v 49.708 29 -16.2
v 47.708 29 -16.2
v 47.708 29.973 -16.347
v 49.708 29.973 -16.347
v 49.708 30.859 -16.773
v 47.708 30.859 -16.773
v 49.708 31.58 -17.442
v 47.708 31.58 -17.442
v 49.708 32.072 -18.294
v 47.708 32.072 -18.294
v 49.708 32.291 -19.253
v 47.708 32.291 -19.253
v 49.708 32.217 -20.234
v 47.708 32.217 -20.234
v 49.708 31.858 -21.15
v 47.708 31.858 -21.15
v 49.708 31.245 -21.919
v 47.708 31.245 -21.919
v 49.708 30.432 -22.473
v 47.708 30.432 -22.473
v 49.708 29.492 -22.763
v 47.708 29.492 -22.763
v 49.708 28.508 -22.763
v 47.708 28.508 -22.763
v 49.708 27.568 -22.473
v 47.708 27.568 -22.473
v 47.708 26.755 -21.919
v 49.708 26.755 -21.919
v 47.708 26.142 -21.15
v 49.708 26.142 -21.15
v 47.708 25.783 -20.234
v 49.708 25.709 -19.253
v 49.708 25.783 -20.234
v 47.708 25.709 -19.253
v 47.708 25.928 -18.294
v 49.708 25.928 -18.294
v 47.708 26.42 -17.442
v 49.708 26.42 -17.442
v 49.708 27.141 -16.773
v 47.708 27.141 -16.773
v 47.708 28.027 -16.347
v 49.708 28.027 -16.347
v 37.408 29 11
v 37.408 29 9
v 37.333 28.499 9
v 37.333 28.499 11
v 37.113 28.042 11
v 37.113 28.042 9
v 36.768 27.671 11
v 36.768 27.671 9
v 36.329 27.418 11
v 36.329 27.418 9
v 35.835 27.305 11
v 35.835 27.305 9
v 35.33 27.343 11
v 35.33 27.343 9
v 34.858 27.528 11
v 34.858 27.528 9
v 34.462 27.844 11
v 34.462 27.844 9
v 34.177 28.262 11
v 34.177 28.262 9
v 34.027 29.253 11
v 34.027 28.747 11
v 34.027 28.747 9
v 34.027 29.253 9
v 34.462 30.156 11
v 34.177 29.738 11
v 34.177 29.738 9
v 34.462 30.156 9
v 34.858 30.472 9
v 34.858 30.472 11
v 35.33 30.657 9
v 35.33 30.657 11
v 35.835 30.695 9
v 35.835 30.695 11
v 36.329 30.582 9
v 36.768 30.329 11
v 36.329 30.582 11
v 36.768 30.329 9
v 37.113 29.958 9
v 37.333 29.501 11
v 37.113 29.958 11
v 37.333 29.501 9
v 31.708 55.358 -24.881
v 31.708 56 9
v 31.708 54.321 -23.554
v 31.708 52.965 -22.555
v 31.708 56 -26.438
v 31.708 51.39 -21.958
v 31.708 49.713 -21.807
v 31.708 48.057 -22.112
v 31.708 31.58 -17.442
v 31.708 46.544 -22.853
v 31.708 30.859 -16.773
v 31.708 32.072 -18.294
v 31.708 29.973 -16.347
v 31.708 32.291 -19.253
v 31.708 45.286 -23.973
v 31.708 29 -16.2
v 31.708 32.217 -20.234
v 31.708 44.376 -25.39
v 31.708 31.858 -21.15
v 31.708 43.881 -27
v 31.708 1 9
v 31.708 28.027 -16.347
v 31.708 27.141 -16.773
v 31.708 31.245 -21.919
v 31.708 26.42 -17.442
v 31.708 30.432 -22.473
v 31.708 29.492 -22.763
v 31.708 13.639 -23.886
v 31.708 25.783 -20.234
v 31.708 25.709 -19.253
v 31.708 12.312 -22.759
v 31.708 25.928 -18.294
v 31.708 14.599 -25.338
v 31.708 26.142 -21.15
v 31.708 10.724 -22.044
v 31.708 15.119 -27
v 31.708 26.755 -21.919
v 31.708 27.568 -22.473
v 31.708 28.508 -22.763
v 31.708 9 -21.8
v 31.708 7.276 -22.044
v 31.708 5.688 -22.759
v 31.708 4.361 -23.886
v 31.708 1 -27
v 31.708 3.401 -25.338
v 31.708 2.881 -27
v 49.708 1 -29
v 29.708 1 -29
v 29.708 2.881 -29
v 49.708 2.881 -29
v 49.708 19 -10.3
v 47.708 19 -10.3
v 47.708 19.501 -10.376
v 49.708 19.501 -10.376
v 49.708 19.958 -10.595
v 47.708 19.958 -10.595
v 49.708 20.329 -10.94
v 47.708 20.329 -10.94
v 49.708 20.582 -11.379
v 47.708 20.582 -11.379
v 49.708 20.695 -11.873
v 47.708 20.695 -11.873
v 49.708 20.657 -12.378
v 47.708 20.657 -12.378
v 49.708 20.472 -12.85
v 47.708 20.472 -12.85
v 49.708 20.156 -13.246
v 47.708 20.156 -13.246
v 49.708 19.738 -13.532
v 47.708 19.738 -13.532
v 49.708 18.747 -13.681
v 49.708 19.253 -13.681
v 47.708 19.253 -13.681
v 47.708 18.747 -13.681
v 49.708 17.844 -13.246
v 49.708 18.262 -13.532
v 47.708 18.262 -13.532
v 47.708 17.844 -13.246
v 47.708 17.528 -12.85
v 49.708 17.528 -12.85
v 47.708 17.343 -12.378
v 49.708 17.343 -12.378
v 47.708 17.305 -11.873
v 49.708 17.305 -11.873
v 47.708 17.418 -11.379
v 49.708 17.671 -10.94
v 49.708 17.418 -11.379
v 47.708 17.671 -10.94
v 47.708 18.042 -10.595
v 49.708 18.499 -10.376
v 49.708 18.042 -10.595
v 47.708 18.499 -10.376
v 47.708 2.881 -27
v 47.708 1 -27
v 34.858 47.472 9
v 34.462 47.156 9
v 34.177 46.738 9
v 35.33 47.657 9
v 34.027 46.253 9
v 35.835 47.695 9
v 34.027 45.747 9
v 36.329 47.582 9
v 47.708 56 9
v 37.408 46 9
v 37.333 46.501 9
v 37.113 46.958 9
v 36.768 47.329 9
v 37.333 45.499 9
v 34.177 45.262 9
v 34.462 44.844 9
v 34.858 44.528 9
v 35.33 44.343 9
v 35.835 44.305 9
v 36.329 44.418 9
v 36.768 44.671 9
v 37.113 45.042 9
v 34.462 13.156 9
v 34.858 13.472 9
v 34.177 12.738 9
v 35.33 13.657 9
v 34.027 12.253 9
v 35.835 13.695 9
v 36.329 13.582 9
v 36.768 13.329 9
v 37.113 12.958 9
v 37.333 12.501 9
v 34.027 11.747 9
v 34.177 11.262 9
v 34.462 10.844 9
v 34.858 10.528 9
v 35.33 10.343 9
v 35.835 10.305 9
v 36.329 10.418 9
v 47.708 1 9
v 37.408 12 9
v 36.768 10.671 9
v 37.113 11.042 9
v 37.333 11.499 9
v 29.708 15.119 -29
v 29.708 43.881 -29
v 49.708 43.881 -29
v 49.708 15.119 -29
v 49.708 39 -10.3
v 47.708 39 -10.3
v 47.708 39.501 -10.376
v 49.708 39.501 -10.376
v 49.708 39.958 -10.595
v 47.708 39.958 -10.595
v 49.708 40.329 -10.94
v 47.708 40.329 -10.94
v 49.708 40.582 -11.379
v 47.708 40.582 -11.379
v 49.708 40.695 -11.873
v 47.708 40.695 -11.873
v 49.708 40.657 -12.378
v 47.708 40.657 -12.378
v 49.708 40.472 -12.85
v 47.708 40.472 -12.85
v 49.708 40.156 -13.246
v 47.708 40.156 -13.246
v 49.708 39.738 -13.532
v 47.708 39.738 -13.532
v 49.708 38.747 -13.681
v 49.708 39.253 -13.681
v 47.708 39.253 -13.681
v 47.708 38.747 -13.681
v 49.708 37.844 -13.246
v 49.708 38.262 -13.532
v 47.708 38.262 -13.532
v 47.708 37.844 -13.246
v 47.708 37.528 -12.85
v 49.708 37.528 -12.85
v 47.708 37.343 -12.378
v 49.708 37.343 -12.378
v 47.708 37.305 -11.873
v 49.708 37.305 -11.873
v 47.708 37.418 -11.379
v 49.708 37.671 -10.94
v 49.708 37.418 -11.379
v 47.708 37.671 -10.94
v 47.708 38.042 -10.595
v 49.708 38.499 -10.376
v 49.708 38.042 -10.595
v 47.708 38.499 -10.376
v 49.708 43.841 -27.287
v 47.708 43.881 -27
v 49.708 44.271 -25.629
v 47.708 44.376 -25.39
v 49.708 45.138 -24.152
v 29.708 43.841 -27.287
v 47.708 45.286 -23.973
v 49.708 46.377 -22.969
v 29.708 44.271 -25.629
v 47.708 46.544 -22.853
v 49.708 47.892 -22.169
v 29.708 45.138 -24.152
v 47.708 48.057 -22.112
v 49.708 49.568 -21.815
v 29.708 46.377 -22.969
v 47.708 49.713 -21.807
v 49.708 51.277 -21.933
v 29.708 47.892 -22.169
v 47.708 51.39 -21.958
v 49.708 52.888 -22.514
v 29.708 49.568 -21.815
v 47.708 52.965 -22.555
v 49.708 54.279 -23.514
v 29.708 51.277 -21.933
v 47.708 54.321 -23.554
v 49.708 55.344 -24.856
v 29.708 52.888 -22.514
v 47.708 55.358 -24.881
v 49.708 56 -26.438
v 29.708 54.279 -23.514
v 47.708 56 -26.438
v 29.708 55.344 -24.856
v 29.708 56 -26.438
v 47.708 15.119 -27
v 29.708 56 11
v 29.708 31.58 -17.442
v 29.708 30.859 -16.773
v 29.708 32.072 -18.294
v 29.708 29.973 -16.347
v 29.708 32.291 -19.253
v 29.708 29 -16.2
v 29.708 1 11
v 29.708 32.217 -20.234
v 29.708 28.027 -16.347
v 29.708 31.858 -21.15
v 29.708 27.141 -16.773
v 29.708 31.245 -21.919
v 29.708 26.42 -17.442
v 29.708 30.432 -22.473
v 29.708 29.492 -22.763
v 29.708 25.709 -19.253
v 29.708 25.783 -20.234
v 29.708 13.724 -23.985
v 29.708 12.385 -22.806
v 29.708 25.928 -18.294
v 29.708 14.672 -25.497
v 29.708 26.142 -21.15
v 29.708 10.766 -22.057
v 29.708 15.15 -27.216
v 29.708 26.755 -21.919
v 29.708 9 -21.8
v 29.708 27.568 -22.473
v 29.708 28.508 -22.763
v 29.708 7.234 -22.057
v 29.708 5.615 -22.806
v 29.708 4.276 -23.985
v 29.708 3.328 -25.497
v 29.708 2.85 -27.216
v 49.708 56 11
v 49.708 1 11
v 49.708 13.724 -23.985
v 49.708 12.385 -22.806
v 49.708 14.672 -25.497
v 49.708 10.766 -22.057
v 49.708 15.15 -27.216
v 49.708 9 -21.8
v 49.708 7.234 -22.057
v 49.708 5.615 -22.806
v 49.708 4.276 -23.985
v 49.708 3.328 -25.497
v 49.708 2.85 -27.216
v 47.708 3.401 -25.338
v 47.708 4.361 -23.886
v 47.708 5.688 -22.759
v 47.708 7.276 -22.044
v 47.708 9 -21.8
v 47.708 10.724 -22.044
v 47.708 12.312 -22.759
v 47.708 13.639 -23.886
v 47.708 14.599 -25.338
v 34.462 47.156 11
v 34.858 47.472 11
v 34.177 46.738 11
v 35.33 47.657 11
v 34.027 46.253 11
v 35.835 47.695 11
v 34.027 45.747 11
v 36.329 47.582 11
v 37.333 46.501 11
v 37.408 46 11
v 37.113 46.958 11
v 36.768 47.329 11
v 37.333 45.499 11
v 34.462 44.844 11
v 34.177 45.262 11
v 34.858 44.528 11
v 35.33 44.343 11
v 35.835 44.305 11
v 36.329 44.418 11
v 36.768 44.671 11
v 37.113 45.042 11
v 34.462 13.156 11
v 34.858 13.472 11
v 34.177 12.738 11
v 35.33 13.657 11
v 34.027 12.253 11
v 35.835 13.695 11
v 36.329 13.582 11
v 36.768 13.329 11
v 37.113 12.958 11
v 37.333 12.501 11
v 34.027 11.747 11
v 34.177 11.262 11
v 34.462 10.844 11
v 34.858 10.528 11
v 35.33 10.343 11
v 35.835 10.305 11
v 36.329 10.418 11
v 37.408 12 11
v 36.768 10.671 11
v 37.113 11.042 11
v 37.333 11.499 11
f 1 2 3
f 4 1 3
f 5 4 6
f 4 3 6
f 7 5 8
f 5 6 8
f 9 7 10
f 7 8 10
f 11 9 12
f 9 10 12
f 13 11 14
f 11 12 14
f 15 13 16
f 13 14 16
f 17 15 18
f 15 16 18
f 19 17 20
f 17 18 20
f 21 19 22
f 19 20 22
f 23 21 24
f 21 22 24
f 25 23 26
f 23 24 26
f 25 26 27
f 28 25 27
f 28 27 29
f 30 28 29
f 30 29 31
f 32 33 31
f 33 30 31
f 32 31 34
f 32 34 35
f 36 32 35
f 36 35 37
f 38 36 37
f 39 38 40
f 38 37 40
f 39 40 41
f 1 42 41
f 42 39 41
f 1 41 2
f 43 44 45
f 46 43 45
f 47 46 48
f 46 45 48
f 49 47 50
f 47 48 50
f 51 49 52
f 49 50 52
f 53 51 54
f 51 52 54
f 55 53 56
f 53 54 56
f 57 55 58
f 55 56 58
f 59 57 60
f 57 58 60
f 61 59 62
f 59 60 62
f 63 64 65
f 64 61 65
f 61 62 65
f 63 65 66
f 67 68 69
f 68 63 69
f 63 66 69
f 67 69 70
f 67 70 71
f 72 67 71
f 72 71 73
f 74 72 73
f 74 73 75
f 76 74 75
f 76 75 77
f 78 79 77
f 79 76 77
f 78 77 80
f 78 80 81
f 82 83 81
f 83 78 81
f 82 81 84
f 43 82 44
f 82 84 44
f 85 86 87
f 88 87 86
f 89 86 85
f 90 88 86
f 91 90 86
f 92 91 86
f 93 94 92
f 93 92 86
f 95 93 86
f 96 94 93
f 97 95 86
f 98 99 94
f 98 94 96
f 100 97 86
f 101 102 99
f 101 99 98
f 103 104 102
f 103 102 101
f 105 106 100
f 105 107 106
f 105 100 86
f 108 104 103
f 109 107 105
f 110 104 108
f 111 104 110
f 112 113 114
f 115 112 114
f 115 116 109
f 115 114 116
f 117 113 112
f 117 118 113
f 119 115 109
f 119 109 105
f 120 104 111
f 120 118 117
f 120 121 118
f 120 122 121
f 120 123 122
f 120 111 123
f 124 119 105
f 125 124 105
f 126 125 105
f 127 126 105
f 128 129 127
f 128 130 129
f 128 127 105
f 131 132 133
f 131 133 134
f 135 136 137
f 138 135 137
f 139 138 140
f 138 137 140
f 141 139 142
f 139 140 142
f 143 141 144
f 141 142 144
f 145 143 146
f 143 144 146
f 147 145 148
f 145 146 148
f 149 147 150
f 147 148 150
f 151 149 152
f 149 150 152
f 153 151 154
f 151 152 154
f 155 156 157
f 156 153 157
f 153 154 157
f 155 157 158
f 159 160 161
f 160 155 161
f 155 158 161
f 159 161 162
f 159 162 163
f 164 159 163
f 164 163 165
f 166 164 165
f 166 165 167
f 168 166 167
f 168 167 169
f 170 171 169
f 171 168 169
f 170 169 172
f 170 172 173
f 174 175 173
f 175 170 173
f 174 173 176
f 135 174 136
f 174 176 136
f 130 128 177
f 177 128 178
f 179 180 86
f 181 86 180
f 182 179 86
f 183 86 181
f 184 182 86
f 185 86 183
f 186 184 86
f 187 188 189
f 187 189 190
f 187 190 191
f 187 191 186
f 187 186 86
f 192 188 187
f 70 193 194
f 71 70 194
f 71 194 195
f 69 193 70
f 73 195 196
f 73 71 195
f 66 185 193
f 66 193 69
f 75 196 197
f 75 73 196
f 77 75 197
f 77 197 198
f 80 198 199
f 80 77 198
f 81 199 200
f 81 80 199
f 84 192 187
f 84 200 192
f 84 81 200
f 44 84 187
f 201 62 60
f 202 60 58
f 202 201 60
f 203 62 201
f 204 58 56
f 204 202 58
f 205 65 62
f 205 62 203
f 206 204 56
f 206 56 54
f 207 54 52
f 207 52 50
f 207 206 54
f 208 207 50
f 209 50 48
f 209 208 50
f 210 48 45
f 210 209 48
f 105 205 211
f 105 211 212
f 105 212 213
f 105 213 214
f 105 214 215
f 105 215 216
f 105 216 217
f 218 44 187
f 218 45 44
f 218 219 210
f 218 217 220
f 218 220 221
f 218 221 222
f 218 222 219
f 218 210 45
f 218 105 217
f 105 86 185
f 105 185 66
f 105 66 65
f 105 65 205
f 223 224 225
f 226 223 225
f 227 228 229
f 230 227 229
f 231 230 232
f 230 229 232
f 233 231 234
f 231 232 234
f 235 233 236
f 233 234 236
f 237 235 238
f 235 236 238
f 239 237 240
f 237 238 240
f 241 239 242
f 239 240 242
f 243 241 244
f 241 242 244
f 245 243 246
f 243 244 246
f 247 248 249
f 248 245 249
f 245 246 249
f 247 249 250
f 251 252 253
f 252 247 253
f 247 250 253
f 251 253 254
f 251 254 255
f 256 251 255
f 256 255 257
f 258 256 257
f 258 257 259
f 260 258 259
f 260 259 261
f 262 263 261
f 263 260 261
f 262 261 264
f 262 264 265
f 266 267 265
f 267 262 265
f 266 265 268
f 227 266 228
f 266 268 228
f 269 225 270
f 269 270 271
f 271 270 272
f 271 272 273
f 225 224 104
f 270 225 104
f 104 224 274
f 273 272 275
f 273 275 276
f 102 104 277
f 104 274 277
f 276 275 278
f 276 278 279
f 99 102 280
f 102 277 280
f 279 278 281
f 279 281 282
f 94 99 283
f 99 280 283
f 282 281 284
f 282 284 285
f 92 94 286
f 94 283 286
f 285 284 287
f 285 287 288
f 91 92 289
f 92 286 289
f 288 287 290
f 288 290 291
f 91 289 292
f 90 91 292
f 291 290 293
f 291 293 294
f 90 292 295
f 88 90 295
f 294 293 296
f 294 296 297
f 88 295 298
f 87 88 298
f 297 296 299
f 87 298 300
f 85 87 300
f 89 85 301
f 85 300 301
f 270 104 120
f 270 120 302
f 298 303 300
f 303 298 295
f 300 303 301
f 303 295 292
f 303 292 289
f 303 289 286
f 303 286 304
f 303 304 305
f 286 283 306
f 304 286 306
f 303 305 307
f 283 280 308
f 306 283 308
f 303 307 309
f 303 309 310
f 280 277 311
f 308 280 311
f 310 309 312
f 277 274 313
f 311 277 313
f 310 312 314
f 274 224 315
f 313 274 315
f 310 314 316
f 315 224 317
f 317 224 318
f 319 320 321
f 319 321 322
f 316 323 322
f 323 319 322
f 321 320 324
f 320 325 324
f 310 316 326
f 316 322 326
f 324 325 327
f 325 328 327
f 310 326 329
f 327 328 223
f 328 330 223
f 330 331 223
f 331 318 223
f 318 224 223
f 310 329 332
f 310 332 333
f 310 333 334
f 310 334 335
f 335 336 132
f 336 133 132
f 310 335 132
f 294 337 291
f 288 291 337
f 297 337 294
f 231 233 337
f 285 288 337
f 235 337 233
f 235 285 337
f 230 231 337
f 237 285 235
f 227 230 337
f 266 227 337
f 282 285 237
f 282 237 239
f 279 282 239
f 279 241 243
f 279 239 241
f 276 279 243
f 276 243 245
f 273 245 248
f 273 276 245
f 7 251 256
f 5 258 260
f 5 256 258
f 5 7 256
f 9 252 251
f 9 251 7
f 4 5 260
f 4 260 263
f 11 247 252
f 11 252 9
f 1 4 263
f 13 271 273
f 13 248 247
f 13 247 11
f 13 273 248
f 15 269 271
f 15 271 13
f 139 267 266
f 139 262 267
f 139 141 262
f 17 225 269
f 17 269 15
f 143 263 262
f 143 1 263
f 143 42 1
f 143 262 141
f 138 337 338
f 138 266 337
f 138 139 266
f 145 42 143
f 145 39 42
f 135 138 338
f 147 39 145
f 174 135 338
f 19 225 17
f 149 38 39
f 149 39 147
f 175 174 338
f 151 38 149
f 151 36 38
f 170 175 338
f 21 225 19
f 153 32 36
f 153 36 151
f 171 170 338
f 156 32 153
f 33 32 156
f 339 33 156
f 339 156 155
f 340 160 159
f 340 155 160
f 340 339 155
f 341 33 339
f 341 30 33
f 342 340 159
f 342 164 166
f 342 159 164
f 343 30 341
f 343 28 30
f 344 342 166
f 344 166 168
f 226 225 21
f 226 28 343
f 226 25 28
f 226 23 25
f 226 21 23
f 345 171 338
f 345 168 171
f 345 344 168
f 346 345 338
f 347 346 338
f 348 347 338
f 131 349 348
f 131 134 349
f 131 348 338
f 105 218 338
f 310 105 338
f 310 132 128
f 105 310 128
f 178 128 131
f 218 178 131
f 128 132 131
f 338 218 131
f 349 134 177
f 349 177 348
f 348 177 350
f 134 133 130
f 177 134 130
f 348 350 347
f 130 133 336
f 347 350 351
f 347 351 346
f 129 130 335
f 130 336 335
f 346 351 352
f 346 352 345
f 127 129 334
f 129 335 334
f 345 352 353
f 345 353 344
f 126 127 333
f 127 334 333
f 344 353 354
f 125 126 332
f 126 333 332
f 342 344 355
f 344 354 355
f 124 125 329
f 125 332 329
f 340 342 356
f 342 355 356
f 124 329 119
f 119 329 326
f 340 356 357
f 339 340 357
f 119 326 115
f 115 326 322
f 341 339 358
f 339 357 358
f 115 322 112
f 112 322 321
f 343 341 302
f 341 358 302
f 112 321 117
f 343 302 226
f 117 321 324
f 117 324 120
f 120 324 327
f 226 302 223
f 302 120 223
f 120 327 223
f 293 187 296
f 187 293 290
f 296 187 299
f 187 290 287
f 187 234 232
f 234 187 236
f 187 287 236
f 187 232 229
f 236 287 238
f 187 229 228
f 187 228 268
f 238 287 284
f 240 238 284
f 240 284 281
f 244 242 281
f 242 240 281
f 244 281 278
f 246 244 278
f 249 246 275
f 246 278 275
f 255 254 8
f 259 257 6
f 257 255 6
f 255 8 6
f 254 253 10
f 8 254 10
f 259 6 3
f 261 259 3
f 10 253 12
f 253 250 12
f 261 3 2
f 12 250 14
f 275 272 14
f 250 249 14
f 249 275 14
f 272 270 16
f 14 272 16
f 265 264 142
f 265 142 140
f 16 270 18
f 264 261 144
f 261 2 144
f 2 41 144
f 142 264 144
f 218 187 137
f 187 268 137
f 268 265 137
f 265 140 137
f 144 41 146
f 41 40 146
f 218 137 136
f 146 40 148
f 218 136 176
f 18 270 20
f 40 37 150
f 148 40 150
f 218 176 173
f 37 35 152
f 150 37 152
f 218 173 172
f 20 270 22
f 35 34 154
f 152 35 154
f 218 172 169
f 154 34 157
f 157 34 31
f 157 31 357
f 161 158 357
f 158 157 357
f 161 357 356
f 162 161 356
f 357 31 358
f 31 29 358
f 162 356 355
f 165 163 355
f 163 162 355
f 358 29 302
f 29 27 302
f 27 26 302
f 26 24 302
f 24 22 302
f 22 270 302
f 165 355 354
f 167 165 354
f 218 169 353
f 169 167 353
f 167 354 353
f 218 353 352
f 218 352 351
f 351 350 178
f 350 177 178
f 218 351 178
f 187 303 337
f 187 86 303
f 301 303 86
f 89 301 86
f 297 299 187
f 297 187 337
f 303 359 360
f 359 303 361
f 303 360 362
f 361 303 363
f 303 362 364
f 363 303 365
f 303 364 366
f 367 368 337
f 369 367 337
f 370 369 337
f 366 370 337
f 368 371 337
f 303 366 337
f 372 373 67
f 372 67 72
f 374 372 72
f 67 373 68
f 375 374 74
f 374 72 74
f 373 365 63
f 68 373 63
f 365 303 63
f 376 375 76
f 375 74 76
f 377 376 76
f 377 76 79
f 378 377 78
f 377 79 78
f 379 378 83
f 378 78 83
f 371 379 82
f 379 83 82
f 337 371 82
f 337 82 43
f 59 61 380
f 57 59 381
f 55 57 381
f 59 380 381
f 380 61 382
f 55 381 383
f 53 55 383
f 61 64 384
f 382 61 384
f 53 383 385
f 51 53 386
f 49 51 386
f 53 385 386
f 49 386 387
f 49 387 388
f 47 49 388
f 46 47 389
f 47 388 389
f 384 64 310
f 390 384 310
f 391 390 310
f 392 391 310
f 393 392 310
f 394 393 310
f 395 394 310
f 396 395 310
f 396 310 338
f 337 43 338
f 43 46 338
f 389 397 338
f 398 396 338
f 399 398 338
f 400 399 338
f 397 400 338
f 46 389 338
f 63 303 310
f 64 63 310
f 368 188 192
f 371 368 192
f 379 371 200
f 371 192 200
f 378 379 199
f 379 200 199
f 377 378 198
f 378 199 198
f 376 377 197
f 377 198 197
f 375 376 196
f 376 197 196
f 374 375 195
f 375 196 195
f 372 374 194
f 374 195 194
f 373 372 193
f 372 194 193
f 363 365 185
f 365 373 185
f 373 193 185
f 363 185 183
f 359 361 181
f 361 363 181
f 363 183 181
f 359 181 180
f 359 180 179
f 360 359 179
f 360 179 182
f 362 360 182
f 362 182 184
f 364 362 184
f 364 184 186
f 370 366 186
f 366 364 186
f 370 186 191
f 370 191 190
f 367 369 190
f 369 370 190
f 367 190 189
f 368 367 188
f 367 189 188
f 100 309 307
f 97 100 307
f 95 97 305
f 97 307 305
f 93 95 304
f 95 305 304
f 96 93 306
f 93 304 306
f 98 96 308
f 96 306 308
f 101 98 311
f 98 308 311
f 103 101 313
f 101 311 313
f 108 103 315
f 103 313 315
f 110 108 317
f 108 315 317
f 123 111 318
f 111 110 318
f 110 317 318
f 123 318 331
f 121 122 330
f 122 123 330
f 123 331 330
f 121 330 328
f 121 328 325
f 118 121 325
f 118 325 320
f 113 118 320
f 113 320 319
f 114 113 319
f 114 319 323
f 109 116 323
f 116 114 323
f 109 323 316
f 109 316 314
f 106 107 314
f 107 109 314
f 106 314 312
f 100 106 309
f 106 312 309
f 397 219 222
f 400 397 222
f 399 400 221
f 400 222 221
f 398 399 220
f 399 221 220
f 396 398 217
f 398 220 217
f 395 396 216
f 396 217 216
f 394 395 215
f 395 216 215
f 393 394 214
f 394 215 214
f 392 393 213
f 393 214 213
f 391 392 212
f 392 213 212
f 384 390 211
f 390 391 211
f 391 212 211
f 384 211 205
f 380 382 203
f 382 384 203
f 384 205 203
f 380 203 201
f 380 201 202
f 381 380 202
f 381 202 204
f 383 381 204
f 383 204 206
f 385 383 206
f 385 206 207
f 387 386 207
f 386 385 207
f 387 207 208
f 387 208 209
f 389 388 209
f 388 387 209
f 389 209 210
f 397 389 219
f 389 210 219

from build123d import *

# Parameters (mm, degrees)
STEEL_TUBE_STOCK_SKETCH_W        = 20
STEEL_TUBE_STOCK_SKETCH_H        = 55
STEEL_TUBE_STOCK_DEPTH           = 40
TUBE_INTERIOR_SKETCH_W           = 16
TUBE_INTERIOR_SKETCH_H           = 55.2
TUBE_INTERIOR_DEPTH              = 36
GUIDE_BUSH_CLEARANCE_1_SKETCH_R  = 6.2
GUIDE_BUSH_CLEARANCE_1_DEPTH     = 20.3
GUIDE_BUSH_CLEARANCE_2_SKETCH_R  = 6.2
GUIDE_BUSH_CLEARANCE_2_DEPTH     = 20.3
SCREW_THROUGH_CLEARANCE_SKETCH_R = 3.3
SCREW_THROUGH_CLEARANCE_DEPTH    = 20.3
SPRING_PIN_CLEARANCE_1_SKETCH_R  = 1.7
SPRING_PIN_CLEARANCE_1_DEPTH     = 2.2
SPRING_PIN_CLEARANCE_2_SKETCH_R  = 1.7
SPRING_PIN_CLEARANCE_2_DEPTH     = 2.2
SPRING_PIN_CLEARANCE_3_SKETCH_R  = 1.7
SPRING_PIN_CLEARANCE_3_DEPTH     = 2.2
CLAMP_BOLT_CLEARANCE_1_SKETCH_R  = 1.7
CLAMP_BOLT_CLEARANCE_1_DEPTH     = 2.3
CLAMP_BOLT_CLEARANCE_2_SKETCH_R  = 1.7
CLAMP_BOLT_CLEARANCE_2_DEPTH     = 2.3


with BuildPart() as part:
    # Steel tube stock sketch → Steel tube stock (new body)
    with BuildSketch(Plane.XY.offset(-29)):
        with Locations((39.708348754, -28.5)):
            Rectangle(STEEL_TUBE_STOCK_SKETCH_W, STEEL_TUBE_STOCK_SKETCH_H)
    extrude(amount=STEEL_TUBE_STOCK_DEPTH)

    # Tube interior sketch → Tube interior (cut)
    with BuildSketch(Plane.XY.offset(-27)):
        with Locations((39.708348754, -28.5)):
            Rectangle(TUBE_INTERIOR_SKETCH_W, TUBE_INTERIOR_SKETCH_H)
    extrude(amount=TUBE_INTERIOR_DEPTH, mode=Mode.SUBTRACT)

    # Guide bush clearance 1 sketch → Guide bush clearance 1 (cut)
    with BuildSketch(Plane(origin=(29.6, 0, 0), x_dir=(0, 0, -1), z_dir=(1, 0, 0))):
        with Locations((28, -9)):
            Circle(GUIDE_BUSH_CLEARANCE_1_SKETCH_R)
    extrude(amount=GUIDE_BUSH_CLEARANCE_1_DEPTH, mode=Mode.SUBTRACT)

    # Guide bush clearance 2 sketch → Guide bush clearance 2 (cut)
    with BuildSketch(Plane(origin=(29.6, 0, 0), x_dir=(0, 0, -1), z_dir=(1, 0, 0))):
        with Locations((28, -50)):
            Circle(GUIDE_BUSH_CLEARANCE_2_SKETCH_R)
    extrude(amount=GUIDE_BUSH_CLEARANCE_2_DEPTH, mode=Mode.SUBTRACT)

    # Screw through clearance sketch → Screw through clearance (cut)
    with BuildSketch(Plane(origin=(29.6, 0, 0), x_dir=(0, 0, -1), z_dir=(1, 0, 0))):
        with Locations(Location((19.5, -29, 0), (0, 0, 180))):
            Circle(SCREW_THROUGH_CLEARANCE_SKETCH_R)
    extrude(amount=SCREW_THROUGH_CLEARANCE_DEPTH, mode=Mode.SUBTRACT)

    # Spring pin clearance 1 sketch → Spring pin clearance 1 (cut)
    with BuildSketch(Plane.XY.offset(8.9)):
        with Locations((35.708348754, -12)):
            Circle(SPRING_PIN_CLEARANCE_1_SKETCH_R)
    extrude(amount=SPRING_PIN_CLEARANCE_1_DEPTH, mode=Mode.SUBTRACT)

    # Spring pin clearance 2 sketch → Spring pin clearance 2 (cut)
    with BuildSketch(Plane.XY.offset(8.9)):
        with Locations((35.708348754, -29)):
            Circle(SPRING_PIN_CLEARANCE_2_SKETCH_R)
    extrude(amount=SPRING_PIN_CLEARANCE_2_DEPTH, mode=Mode.SUBTRACT)

    # Spring pin clearance 3 sketch → Spring pin clearance 3 (cut)
    with BuildSketch(Plane.XY.offset(8.9)):
        with Locations((35.708348754, -46)):
            Circle(SPRING_PIN_CLEARANCE_3_SKETCH_R)
    extrude(amount=SPRING_PIN_CLEARANCE_3_DEPTH, mode=Mode.SUBTRACT)

    # Clamp bolt clearance 1 sketch → Clamp bolt clearance 1 (cut)
    with BuildSketch(Plane(origin=(47.6, 0, 0), x_dir=(0, 0, -1), z_dir=(1, 0, 0))):
        with Locations(Location((12, -19, 0), (0, 0, 180))):
            Circle(CLAMP_BOLT_CLEARANCE_1_SKETCH_R)
    extrude(amount=CLAMP_BOLT_CLEARANCE_1_DEPTH, mode=Mode.SUBTRACT)

    # Clamp bolt clearance 2 sketch → Clamp bolt clearance 2 (cut)
    with BuildSketch(Plane(origin=(47.6, 0, 0), x_dir=(0, 0, -1), z_dir=(1, 0, 0))):
        with Locations(Location((12, -39, 0), (0, 0, 180))):
            Circle(CLAMP_BOLT_CLEARANCE_2_SKETCH_R)
    extrude(amount=CLAMP_BOLT_CLEARANCE_2_DEPTH, mode=Mode.SUBTRACT)


with BuildPart() as body_2:
    # Mirror1: mirrored copy
    add(part.part.mirror(Plane(origin=(0, 0, 0), x_dir=(0, 0, 1), z_dir=(0, -1, 0))))


solid = body_2.part
